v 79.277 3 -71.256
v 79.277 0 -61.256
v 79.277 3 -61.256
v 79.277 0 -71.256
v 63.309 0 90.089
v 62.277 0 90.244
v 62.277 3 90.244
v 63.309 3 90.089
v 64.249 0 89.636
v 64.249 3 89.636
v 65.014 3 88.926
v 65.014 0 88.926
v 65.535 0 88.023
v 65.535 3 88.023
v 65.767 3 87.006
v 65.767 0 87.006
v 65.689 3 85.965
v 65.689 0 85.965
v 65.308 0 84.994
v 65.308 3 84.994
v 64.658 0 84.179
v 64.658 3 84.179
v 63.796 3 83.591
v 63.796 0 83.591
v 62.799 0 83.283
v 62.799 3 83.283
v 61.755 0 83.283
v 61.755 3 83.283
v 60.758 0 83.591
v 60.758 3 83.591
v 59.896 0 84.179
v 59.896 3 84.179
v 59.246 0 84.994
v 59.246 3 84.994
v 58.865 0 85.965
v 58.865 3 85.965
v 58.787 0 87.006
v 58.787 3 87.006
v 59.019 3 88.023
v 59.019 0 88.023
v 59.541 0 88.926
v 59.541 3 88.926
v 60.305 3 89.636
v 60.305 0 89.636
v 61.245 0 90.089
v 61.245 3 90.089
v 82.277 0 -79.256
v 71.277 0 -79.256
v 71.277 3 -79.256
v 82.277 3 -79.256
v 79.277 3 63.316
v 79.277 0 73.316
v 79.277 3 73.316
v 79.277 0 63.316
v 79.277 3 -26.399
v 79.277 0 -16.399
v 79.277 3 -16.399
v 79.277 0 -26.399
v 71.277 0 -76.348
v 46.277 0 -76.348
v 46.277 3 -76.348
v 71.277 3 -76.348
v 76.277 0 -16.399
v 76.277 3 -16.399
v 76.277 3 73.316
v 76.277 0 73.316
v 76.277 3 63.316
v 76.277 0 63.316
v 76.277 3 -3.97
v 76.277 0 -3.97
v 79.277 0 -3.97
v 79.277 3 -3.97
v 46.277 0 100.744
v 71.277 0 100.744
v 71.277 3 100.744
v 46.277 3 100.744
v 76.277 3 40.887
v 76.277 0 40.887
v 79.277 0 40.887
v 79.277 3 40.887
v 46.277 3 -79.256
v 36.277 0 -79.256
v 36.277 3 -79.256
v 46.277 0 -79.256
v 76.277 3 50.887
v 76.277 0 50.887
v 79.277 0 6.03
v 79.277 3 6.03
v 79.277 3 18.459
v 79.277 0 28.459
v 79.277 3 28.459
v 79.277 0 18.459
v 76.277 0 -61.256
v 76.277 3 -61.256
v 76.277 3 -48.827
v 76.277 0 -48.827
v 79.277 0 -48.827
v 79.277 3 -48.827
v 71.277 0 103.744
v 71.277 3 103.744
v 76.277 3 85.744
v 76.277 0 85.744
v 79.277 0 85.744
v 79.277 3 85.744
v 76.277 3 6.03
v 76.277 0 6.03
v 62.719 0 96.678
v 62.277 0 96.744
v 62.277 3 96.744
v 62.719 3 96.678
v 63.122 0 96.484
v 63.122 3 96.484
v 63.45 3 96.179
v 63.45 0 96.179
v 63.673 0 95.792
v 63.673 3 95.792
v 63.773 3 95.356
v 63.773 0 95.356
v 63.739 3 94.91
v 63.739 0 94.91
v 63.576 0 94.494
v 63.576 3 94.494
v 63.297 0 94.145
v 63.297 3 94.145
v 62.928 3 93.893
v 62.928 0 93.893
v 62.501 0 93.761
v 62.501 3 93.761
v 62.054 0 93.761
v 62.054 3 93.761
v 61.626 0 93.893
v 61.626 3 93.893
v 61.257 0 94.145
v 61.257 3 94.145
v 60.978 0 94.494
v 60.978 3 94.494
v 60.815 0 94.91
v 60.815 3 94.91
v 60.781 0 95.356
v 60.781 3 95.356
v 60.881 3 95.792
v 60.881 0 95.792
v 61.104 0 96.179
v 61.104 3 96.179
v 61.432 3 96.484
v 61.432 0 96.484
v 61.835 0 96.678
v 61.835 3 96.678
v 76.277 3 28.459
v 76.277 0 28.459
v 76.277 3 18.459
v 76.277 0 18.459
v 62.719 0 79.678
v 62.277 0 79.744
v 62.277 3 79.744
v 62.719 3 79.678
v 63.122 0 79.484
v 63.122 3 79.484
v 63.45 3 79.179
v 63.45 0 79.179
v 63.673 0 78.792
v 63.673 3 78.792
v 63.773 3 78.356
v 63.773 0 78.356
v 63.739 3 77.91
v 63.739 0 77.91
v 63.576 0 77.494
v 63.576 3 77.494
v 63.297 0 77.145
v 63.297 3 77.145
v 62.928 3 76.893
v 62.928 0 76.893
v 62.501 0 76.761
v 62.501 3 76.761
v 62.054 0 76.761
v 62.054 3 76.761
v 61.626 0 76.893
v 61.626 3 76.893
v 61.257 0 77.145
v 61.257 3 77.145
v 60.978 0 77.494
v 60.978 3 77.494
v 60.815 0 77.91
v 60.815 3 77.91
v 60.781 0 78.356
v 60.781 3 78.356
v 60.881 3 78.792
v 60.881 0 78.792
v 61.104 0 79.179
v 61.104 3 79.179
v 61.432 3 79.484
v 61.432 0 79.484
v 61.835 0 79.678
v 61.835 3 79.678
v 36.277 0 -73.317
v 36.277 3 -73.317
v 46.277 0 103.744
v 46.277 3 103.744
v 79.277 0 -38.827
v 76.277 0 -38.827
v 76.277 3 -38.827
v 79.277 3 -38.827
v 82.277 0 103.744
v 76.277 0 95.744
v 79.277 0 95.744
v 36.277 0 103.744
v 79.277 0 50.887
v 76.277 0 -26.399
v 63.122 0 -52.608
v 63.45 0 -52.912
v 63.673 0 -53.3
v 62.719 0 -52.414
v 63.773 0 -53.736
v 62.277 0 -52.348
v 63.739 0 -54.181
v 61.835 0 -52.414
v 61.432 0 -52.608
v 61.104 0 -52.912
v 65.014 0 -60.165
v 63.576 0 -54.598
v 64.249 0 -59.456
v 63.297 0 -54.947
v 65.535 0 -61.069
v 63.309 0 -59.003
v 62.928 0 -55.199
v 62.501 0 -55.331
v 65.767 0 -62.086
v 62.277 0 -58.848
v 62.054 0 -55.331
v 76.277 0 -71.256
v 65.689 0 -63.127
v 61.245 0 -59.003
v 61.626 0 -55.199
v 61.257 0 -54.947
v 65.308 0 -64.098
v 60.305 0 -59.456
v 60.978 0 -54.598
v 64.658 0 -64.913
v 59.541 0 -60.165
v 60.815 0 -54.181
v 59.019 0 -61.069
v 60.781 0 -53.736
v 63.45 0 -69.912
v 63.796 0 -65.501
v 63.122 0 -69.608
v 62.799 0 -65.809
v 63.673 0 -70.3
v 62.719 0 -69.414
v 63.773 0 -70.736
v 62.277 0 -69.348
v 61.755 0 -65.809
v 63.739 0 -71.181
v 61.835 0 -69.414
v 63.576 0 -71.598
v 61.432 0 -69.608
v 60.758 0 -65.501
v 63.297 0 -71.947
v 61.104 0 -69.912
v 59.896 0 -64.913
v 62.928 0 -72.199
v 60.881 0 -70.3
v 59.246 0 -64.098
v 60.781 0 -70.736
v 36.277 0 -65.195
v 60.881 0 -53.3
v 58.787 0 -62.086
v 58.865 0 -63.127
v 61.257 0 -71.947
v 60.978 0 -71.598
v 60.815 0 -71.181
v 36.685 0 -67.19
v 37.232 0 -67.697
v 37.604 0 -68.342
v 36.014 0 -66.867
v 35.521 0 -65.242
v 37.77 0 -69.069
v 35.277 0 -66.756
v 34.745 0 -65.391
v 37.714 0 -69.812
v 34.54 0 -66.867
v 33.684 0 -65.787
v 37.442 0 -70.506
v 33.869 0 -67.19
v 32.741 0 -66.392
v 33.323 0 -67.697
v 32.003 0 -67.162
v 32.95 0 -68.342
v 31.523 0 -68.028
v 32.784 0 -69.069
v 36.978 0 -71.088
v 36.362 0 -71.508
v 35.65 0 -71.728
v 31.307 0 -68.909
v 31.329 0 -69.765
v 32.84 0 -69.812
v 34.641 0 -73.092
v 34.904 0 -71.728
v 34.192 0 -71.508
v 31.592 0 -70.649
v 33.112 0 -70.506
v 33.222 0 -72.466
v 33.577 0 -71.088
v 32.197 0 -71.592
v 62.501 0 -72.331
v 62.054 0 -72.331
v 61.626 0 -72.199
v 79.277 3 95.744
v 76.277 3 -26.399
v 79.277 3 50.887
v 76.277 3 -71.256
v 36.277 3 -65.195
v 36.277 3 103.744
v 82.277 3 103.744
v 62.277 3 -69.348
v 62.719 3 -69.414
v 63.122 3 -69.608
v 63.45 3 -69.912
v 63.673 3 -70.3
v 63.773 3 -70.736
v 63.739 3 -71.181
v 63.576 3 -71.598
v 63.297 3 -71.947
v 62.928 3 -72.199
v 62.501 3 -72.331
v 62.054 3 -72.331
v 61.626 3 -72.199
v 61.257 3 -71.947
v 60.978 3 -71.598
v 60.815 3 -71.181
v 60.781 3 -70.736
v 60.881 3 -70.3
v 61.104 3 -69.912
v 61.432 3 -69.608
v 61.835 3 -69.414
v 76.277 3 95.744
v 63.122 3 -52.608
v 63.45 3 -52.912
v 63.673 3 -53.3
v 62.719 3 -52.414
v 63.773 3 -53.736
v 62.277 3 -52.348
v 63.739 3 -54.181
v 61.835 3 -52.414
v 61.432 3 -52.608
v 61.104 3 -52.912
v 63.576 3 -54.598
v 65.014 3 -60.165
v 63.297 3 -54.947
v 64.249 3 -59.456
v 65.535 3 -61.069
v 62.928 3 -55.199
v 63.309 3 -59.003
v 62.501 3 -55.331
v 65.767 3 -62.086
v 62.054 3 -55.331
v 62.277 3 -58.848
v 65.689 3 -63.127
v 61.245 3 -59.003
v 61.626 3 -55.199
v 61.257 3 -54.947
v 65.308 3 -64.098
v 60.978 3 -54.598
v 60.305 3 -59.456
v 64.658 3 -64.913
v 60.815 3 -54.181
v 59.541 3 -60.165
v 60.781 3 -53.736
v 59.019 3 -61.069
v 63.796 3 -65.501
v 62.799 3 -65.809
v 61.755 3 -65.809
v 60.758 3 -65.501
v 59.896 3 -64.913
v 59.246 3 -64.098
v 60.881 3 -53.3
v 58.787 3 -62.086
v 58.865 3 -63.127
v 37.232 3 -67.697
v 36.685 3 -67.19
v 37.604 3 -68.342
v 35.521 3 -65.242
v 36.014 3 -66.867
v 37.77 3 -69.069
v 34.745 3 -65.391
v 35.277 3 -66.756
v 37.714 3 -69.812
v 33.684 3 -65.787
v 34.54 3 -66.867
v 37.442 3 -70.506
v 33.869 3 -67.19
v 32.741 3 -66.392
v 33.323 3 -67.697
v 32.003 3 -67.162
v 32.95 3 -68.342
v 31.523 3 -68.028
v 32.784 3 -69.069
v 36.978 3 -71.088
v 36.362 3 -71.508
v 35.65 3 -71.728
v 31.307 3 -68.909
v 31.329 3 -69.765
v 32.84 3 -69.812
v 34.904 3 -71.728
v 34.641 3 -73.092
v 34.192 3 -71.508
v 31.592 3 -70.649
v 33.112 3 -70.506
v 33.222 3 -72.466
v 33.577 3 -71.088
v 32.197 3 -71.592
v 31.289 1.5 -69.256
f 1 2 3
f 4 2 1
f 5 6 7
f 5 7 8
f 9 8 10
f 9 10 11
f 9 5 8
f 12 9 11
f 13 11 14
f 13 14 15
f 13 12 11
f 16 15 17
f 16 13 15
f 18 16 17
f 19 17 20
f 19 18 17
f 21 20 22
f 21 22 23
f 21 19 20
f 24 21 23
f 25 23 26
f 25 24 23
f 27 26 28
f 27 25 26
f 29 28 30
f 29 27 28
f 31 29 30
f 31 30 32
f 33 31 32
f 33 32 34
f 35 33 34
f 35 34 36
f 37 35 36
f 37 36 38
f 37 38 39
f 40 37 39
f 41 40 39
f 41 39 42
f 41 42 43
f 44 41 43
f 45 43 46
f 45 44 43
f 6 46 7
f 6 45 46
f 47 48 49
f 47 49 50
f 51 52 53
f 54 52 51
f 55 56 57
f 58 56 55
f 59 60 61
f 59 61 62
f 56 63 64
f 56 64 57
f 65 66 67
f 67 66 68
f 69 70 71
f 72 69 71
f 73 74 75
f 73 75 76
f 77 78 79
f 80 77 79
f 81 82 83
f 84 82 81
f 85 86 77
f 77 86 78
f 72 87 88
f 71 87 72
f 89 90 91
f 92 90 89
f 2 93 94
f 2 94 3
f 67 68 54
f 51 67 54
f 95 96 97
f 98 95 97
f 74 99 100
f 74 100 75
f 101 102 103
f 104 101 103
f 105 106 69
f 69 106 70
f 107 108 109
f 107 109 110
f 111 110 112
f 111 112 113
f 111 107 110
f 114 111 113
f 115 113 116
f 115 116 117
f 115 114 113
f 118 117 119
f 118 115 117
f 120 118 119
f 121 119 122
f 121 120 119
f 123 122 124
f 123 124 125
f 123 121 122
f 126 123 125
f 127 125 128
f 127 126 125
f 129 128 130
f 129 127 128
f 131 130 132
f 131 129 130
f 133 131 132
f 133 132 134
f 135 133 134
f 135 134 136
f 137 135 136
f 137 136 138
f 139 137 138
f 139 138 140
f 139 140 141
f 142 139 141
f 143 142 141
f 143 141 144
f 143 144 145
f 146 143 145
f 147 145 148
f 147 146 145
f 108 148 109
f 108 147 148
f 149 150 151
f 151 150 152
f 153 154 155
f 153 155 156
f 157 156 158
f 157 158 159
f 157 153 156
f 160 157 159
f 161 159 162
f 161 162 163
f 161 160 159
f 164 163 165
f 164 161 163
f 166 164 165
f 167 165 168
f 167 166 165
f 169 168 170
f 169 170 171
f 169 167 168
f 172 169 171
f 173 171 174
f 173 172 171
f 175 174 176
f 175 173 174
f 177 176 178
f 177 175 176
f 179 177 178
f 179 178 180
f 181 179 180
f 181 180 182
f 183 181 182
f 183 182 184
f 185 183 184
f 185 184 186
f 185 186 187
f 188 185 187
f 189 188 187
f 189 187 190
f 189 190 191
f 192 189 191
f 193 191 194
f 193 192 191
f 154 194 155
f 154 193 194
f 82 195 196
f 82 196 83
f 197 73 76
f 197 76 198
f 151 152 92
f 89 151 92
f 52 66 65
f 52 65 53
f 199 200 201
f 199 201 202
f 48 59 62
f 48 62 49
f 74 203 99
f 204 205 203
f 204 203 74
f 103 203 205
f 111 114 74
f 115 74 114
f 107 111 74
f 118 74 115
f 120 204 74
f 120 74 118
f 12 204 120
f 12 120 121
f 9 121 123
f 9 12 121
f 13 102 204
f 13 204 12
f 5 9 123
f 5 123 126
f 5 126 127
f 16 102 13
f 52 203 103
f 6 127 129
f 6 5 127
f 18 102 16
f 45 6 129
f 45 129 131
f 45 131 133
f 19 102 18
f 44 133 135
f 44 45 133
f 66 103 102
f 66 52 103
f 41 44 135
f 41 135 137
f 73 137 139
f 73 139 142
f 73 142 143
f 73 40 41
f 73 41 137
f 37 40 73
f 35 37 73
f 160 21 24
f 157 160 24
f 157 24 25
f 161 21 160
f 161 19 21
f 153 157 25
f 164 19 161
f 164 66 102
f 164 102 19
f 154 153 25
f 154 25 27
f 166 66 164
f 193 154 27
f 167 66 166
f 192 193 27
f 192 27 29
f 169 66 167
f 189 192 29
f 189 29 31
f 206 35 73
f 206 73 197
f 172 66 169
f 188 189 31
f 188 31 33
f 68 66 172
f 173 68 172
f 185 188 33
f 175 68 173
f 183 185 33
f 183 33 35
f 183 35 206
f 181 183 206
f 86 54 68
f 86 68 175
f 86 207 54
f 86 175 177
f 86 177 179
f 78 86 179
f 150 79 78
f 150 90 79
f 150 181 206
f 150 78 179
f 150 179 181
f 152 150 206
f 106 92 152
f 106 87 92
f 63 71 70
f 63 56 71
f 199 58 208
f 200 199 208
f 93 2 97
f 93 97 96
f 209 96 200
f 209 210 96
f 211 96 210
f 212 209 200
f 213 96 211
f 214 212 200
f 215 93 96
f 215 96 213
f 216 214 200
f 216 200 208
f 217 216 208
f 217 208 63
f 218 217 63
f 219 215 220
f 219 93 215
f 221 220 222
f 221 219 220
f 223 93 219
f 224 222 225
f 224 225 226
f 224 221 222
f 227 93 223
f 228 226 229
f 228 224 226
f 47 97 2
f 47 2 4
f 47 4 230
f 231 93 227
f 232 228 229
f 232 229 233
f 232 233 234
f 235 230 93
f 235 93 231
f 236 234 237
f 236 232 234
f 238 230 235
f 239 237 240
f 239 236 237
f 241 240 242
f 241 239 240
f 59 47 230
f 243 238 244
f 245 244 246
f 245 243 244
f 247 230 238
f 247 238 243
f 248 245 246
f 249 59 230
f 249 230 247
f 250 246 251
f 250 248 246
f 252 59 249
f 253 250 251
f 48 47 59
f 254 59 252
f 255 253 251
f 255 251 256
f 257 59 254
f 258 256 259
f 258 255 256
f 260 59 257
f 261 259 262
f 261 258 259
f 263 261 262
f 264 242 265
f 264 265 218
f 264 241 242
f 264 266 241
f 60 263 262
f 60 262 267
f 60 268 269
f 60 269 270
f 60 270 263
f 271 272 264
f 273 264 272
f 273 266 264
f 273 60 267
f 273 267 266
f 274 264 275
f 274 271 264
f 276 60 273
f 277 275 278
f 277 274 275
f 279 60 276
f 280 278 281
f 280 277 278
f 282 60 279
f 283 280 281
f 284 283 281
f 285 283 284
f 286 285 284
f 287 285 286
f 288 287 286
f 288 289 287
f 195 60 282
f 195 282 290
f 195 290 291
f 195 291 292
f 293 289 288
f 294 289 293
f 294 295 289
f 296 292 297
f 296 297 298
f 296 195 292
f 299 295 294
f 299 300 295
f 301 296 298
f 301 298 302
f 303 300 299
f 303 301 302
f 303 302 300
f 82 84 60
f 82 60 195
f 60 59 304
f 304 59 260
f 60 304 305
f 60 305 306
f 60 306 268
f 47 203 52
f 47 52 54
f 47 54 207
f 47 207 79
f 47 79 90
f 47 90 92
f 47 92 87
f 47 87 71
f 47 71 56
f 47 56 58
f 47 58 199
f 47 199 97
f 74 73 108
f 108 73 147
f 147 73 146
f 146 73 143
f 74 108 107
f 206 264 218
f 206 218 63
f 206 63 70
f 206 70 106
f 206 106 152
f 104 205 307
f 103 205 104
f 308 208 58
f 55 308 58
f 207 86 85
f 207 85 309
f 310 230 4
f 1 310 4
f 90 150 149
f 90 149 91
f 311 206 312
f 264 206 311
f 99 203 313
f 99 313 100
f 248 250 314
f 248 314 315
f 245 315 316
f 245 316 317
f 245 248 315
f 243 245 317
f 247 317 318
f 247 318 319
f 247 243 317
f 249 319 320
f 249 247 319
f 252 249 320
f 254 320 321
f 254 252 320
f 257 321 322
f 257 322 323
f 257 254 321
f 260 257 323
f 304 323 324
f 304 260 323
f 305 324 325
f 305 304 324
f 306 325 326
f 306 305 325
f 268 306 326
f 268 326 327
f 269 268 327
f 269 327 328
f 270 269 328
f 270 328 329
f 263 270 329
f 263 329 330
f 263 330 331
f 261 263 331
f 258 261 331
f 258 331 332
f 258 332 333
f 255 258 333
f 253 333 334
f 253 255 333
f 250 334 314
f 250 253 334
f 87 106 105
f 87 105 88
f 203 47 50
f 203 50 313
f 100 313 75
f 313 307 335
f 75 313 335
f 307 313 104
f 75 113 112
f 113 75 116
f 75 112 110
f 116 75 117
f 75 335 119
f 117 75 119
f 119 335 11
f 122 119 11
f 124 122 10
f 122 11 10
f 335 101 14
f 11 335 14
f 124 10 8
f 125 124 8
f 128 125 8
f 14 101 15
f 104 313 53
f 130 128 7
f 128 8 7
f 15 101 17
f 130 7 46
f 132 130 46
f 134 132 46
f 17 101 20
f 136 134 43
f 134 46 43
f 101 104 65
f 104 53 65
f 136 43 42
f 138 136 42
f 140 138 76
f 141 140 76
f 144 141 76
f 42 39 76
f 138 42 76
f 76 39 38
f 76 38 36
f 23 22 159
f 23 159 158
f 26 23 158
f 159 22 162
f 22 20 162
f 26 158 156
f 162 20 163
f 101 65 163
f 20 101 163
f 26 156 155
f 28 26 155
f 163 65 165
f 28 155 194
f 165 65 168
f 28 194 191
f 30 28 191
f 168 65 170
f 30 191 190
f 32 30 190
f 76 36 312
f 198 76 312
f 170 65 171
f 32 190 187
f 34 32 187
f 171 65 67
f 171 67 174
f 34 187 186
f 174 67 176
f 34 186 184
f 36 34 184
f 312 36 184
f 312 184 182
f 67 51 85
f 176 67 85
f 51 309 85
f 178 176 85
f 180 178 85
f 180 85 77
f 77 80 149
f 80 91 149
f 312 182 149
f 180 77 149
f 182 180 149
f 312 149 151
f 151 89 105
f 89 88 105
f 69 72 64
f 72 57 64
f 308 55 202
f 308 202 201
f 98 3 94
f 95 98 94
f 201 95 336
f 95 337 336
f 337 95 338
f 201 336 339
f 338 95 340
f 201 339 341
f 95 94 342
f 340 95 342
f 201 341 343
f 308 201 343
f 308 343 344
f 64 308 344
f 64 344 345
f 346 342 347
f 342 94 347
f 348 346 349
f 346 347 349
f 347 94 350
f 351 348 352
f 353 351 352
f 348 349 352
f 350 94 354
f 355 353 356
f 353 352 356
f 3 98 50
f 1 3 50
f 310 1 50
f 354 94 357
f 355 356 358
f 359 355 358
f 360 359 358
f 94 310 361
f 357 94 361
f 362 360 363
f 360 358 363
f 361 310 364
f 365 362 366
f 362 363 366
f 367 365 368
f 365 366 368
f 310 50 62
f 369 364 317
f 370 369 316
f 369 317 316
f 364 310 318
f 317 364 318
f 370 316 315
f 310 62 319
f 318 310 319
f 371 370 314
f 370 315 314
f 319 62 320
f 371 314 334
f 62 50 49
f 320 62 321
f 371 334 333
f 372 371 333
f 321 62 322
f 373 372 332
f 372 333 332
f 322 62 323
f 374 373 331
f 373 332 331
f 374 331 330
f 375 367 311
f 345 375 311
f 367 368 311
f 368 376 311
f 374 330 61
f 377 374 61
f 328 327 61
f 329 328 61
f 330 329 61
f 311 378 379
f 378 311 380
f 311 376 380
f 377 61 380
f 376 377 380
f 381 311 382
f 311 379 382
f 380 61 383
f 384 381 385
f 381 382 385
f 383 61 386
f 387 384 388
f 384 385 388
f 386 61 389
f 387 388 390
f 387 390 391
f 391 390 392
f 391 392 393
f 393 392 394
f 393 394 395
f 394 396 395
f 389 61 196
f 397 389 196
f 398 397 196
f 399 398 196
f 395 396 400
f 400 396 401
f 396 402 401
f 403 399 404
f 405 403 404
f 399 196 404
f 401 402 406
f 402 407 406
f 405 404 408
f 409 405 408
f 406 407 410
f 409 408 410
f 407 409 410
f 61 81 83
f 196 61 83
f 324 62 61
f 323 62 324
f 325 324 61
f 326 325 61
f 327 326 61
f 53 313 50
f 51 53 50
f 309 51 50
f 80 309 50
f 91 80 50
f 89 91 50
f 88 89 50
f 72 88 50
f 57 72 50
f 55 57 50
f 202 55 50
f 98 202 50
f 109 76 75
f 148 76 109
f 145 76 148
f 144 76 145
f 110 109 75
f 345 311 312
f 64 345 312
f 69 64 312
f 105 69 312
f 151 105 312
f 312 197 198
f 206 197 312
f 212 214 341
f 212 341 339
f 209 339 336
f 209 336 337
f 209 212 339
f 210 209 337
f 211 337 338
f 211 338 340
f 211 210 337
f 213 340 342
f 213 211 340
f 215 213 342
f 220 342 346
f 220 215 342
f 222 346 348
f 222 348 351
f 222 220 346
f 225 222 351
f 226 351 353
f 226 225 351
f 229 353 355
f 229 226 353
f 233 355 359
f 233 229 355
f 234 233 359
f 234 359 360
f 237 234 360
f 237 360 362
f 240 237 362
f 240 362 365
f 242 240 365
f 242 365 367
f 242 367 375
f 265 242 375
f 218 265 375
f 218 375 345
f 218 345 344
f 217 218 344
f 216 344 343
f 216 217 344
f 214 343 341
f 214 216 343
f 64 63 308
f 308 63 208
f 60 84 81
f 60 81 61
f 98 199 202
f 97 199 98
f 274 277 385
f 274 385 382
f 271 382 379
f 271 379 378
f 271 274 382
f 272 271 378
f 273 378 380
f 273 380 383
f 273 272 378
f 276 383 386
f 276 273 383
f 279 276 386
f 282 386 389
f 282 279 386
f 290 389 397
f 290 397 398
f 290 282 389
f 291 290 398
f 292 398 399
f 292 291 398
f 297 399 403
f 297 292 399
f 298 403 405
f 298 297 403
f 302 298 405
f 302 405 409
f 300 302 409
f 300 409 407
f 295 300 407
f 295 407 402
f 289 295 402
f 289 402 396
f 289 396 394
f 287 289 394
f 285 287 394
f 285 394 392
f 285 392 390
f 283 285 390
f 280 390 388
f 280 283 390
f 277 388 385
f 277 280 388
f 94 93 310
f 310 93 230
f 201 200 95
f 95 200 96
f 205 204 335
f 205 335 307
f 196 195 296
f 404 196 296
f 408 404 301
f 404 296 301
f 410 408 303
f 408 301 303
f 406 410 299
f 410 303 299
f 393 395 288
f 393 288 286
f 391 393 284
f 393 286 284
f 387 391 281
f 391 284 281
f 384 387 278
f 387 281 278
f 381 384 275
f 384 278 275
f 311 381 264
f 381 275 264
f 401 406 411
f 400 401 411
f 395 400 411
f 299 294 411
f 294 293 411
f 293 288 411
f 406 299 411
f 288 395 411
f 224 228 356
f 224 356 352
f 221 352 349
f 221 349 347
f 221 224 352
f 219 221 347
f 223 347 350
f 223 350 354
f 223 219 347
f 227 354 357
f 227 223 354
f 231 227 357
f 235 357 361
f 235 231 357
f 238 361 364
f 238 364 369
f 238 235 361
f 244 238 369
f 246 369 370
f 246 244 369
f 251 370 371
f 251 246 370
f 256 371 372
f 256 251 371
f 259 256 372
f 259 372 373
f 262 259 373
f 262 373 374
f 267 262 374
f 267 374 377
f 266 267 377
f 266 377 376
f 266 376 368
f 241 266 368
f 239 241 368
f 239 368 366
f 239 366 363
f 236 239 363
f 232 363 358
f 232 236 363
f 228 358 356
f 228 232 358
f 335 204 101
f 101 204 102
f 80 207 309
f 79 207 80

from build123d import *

# Parameters (mm, degrees)
SKETCH1_R           = 2.5
SKETCH1_R_2         = 3.5
SKETCH1_R_3         = 1.5
SKETCH1_W           = 3
SKETCH1_H           = 10
BOSS_EXTRUDE3_DEPTH = 3


with BuildPart() as part:
    # Sketch1 → Boss-Extrude3 (new body)
    with BuildSketch(Plane(origin=(0, 0, 0), x_dir=(1, 0, 0), z_dir=(0, 1, 0))):
        with BuildLine():
            Line((36.277091695, 79.255784564), (46.277091695, 79.255784564))
            Line((46.277091695, 79.255784564), (46.277091695, 76.347710002))
            Line((46.277091695, 76.347710002), (71.277091695, 76.347710002))
            Line((71.277091695, 76.347710002), (71.277091695, 79.255784564))
            Line((71.277091695, 79.255784564), (82.277091695, 79.255784564))
            Line((82.277091695, 79.255784564), (82.277091695, -103.744215436))
            Line((82.277091695, -103.744215436), (71.277091695, -103.744215436))
            Line((71.277091695, -103.744215436), (71.277091695, -100.744215436))
            Line((71.277091695, -100.744215436), (46.277091695, -100.744215436))
            Line((46.277091695, -100.744215436), (46.277091695, -103.744215436))
            Line((46.277091695, -103.744215436), (36.277091695, -103.744215436))
            Line((36.277091695, -103.744215436), (36.277091695, 65.194662811))
            add(Edge.make_bspline(
                [(36.277091695, 73.316906316), (31.289085945, 73.316906316), (31.289085945, 69.255784564), (31.289085945, 65.194662811), (36.277091695, 65.194662811)],
                knots=[4.71238898, 4.71238898, 4.71238898, 6.283185307, 6.283185307, 7.853981634, 7.853981634, 7.853981634], degree=2, weights=[1, 0.707106781, 1, 0.707106781, 1]))
            Line((36.277091695, 73.316906316), (36.277091695, 79.255784564))
        make_face()
        with Locations(Location((35.277091695, 69.255784564, 0), (0, 0, 270))):
            Circle(SKETCH1_R, mode=Mode.SUBTRACT)
        with Locations(Location((62.277091695, 62.347710002, 0), (0, 0, 270))):
            Circle(SKETCH1_R_2, mode=Mode.SUBTRACT)
        with Locations(Location((62.277091695, 70.847710002, 0), (0, 0, 270))):
            Circle(SKETCH1_R_3, mode=Mode.SUBTRACT)
        with Locations(Location((62.277091695, 53.847710002, 0), (0, 0, 270))):
            Circle(SKETCH1_R_3, mode=Mode.SUBTRACT)
        with Locations(Location((62.277091695, -86.744215436, 0), (0, 0, 270))):
            Circle(SKETCH1_R_2, mode=Mode.SUBTRACT)
        with Locations(Location((62.277091695, -78.244215436, 0), (0, 0, 270))):
            Circle(SKETCH1_R_3, mode=Mode.SUBTRACT)
        with Locations(Location((62.277091695, -95.244215436, 0), (0, 0, 270))):
            Circle(SKETCH1_R_3, mode=Mode.SUBTRACT)
        with Locations((77.777091695, 43.827213135)):
            Rectangle(SKETCH1_W, SKETCH1_H, mode=Mode.SUBTRACT)
        with Locations((77.777091695, 66.255784564)):
            Rectangle(SKETCH1_W, SKETCH1_H, mode=Mode.SUBTRACT)
        with Locations((77.777091695, 21.398641707)):
            Rectangle(SKETCH1_W, SKETCH1_H, mode=Mode.SUBTRACT)
        with Locations((77.777091695, -1.029929722)):
            Rectangle(SKETCH1_W, SKETCH1_H, mode=Mode.SUBTRACT)
        with Locations((77.777091695, -23.458501151)):
            Rectangle(SKETCH1_W, SKETCH1_H, mode=Mode.SUBTRACT)
        with Locations((77.777091695, -45.887072579)):
            Rectangle(SKETCH1_W, SKETCH1_H, mode=Mode.SUBTRACT)
        with Locations((77.777091695, -68.315644008)):
            Rectangle(SKETCH1_W, SKETCH1_H, mode=Mode.SUBTRACT)
        with Locations((77.777091695, -90.744215436)):
            Rectangle(SKETCH1_W, SKETCH1_H, mode=Mode.SUBTRACT)
    extrude(amount=BOSS_EXTRUDE3_DEPTH)


solid = part.part
